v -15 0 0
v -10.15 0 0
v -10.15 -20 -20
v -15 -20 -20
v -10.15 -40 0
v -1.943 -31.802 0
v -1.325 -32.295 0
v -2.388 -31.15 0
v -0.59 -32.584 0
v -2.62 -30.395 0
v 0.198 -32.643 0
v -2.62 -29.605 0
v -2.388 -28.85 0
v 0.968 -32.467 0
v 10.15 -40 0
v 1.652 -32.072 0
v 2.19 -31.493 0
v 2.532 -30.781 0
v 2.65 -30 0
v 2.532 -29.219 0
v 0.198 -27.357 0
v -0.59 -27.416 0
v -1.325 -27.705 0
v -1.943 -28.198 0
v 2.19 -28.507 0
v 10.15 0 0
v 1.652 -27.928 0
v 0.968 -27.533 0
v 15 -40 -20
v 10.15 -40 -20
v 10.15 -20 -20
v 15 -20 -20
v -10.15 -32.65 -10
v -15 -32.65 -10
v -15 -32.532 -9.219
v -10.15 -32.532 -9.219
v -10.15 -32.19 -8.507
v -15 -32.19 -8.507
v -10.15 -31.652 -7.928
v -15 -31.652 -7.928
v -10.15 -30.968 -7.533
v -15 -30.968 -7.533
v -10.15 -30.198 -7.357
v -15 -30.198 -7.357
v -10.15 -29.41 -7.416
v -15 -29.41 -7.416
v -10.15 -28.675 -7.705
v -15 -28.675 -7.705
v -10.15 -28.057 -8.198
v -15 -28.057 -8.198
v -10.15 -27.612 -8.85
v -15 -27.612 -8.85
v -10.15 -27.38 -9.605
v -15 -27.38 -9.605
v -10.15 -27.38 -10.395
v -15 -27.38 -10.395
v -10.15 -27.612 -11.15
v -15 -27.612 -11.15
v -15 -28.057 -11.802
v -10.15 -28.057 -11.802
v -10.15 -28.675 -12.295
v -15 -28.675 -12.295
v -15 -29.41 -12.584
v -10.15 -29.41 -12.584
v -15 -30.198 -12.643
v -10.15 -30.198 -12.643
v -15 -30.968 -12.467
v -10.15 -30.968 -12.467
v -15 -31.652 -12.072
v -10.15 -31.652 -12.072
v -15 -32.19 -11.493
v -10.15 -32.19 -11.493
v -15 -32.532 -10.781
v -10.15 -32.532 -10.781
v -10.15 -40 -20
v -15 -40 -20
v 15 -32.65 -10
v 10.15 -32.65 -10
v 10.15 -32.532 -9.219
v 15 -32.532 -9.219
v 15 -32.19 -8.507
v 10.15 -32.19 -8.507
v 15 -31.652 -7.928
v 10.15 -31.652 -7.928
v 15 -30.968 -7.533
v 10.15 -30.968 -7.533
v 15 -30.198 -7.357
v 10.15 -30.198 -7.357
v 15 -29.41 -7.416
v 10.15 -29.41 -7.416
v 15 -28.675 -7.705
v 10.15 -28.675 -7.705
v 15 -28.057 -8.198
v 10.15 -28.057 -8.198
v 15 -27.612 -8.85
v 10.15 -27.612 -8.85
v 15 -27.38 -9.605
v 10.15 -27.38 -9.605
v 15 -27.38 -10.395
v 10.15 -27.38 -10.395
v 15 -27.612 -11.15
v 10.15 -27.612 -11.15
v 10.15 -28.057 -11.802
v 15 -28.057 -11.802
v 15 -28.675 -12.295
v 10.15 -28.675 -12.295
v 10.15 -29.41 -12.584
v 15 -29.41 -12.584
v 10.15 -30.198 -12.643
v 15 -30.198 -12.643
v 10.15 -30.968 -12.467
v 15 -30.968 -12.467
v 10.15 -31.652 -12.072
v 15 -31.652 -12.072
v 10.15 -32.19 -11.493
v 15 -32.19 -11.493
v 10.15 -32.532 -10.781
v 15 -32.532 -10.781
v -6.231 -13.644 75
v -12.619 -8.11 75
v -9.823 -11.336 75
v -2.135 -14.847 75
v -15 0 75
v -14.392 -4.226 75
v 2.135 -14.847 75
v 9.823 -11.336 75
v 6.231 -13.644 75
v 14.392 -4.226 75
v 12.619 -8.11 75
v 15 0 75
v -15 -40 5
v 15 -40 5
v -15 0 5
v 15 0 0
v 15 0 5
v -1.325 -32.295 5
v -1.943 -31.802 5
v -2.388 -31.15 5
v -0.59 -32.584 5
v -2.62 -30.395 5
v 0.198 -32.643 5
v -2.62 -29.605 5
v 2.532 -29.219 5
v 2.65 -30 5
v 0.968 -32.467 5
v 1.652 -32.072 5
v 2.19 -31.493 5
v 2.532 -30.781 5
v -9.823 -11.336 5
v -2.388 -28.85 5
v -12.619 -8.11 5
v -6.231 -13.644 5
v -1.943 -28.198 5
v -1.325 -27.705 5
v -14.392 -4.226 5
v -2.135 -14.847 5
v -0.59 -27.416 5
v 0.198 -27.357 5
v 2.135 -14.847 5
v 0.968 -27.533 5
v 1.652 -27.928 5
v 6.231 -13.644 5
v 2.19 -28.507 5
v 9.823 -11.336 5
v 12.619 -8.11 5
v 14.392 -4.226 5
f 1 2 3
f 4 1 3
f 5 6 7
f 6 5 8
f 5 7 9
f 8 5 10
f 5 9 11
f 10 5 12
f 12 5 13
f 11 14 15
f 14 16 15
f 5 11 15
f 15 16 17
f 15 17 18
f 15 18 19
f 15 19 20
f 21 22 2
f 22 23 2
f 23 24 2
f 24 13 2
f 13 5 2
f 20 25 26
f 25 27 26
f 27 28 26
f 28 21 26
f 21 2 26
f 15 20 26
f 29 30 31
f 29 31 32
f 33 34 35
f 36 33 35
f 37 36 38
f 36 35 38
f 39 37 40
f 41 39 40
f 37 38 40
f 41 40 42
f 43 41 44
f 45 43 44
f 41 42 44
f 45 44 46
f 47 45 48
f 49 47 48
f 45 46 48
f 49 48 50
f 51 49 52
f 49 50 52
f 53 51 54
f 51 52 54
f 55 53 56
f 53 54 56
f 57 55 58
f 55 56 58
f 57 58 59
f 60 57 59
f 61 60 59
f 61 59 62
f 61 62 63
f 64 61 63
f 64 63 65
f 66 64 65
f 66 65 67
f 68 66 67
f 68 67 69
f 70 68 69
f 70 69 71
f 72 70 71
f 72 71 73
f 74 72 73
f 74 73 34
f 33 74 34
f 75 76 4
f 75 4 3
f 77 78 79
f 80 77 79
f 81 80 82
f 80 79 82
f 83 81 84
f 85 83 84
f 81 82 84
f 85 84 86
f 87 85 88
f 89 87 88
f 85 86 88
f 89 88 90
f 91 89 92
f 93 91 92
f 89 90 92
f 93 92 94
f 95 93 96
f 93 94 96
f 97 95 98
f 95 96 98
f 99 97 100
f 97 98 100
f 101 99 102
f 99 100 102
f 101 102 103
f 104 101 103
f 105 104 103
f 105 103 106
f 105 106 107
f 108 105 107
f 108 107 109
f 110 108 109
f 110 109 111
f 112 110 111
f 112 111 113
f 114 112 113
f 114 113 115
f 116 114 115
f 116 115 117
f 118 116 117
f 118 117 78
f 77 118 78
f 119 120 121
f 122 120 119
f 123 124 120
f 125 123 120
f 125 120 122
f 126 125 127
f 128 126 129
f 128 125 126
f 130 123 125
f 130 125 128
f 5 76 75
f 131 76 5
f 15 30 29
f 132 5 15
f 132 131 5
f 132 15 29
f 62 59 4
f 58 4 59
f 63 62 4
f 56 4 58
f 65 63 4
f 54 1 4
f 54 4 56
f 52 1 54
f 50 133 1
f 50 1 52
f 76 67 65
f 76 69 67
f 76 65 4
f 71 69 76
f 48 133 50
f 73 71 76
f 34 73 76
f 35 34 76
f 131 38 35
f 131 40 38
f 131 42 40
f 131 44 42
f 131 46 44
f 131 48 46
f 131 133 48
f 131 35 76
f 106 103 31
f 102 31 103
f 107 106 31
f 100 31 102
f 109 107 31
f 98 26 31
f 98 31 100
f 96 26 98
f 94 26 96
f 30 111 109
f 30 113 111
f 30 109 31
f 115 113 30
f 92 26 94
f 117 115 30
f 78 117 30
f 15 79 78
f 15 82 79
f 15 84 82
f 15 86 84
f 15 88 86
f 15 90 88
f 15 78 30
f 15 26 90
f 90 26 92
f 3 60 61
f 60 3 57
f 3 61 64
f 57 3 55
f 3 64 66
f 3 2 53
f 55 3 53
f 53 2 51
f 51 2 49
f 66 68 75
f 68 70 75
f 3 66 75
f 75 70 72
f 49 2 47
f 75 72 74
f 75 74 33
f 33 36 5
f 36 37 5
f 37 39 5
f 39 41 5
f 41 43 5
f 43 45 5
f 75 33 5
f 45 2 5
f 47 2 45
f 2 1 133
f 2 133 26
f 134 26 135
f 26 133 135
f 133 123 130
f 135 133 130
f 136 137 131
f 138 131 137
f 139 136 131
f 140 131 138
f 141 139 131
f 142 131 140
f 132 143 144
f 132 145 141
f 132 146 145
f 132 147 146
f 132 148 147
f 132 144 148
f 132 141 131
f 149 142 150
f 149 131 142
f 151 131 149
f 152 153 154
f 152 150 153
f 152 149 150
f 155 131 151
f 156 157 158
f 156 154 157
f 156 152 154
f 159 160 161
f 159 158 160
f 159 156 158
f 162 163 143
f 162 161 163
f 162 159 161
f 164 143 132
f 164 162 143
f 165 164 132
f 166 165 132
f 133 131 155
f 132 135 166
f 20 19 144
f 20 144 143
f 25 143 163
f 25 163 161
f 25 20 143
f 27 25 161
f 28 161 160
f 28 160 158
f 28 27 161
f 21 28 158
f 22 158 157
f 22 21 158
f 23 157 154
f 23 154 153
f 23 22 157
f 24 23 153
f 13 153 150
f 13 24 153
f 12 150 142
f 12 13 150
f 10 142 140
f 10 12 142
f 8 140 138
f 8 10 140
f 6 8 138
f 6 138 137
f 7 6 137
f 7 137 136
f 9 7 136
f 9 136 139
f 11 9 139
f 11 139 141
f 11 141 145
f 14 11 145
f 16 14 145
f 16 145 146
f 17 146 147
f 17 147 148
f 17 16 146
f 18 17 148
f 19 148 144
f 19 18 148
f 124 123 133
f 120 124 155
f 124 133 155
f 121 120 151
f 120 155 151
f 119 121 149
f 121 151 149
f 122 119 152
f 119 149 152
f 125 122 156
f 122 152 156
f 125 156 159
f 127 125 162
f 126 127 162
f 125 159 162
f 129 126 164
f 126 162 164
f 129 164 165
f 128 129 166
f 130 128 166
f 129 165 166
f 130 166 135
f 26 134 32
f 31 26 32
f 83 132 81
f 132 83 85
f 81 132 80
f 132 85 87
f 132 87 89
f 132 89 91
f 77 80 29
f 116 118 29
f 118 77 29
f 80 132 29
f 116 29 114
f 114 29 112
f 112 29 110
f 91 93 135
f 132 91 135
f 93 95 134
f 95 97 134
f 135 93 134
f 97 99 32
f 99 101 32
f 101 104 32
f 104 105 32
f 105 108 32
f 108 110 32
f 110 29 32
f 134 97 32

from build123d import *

# Parameters (mm, degrees)
F1_DEPTH = 75
F2_W     = 30
F2_H     = 40
F2_R     = 2.65
F3_DEPTH = 5
F4_W     = 4.85
F4_H     = 40
F5_DEPTH = 20
F6_R     = 2.65
F7_DEPTH = 30
F9_DEPTH = 30


with BuildPart() as f1:
    # F0 (on Top) → F1 (new body)
    with BuildSketch(Plane.XY):
        with BuildLine():
            Line((15, 0), (-15, 0))
            ThreePointArc((-15, 0), (0, -15), (15, 0))
        make_face()
    extrude(amount=F1_DEPTH)

    # F2 (on Top) → F3 (join)
    with BuildSketch(Plane.XY):
        with Locations((0, -20)):
            Rectangle(F2_W, F2_H)
        with Locations((0, -30)):
            Circle(F2_R, mode=Mode.SUBTRACT)
    extrude(amount=F3_DEPTH)

    # F4 (on face) → F5 (join)
    with BuildSketch(Plane(origin=(0, 0, 0), x_dir=(1, 0, 0), z_dir=(0, 0, -1))):
        with Locations((-12.575, 20)):
            Rectangle(F4_W, F4_H)
        with Locations((12.575, 20)):
            Rectangle(F4_W, F4_H)
    extrude(amount=F5_DEPTH)

    # F6 (on face) → F7 (cut, through all)
    with BuildSketch(Plane(origin=(-15, 0, 0), x_dir=(0, -1, 0), z_dir=(-1, 0, 0))):
        with Locations((30, -10)):
            Circle(F6_R)
    extrude(amount=-F7_DEPTH, mode=Mode.SUBTRACT)

    # F8 (on face) → F9 (cut, through all)
    with BuildSketch(Plane.YZ.offset(15)):
        Polygon((0, 0), (-20, -20), (0, -20), align=None)
    extrude(amount=-F9_DEPTH, mode=Mode.SUBTRACT)


solid = f1.part
